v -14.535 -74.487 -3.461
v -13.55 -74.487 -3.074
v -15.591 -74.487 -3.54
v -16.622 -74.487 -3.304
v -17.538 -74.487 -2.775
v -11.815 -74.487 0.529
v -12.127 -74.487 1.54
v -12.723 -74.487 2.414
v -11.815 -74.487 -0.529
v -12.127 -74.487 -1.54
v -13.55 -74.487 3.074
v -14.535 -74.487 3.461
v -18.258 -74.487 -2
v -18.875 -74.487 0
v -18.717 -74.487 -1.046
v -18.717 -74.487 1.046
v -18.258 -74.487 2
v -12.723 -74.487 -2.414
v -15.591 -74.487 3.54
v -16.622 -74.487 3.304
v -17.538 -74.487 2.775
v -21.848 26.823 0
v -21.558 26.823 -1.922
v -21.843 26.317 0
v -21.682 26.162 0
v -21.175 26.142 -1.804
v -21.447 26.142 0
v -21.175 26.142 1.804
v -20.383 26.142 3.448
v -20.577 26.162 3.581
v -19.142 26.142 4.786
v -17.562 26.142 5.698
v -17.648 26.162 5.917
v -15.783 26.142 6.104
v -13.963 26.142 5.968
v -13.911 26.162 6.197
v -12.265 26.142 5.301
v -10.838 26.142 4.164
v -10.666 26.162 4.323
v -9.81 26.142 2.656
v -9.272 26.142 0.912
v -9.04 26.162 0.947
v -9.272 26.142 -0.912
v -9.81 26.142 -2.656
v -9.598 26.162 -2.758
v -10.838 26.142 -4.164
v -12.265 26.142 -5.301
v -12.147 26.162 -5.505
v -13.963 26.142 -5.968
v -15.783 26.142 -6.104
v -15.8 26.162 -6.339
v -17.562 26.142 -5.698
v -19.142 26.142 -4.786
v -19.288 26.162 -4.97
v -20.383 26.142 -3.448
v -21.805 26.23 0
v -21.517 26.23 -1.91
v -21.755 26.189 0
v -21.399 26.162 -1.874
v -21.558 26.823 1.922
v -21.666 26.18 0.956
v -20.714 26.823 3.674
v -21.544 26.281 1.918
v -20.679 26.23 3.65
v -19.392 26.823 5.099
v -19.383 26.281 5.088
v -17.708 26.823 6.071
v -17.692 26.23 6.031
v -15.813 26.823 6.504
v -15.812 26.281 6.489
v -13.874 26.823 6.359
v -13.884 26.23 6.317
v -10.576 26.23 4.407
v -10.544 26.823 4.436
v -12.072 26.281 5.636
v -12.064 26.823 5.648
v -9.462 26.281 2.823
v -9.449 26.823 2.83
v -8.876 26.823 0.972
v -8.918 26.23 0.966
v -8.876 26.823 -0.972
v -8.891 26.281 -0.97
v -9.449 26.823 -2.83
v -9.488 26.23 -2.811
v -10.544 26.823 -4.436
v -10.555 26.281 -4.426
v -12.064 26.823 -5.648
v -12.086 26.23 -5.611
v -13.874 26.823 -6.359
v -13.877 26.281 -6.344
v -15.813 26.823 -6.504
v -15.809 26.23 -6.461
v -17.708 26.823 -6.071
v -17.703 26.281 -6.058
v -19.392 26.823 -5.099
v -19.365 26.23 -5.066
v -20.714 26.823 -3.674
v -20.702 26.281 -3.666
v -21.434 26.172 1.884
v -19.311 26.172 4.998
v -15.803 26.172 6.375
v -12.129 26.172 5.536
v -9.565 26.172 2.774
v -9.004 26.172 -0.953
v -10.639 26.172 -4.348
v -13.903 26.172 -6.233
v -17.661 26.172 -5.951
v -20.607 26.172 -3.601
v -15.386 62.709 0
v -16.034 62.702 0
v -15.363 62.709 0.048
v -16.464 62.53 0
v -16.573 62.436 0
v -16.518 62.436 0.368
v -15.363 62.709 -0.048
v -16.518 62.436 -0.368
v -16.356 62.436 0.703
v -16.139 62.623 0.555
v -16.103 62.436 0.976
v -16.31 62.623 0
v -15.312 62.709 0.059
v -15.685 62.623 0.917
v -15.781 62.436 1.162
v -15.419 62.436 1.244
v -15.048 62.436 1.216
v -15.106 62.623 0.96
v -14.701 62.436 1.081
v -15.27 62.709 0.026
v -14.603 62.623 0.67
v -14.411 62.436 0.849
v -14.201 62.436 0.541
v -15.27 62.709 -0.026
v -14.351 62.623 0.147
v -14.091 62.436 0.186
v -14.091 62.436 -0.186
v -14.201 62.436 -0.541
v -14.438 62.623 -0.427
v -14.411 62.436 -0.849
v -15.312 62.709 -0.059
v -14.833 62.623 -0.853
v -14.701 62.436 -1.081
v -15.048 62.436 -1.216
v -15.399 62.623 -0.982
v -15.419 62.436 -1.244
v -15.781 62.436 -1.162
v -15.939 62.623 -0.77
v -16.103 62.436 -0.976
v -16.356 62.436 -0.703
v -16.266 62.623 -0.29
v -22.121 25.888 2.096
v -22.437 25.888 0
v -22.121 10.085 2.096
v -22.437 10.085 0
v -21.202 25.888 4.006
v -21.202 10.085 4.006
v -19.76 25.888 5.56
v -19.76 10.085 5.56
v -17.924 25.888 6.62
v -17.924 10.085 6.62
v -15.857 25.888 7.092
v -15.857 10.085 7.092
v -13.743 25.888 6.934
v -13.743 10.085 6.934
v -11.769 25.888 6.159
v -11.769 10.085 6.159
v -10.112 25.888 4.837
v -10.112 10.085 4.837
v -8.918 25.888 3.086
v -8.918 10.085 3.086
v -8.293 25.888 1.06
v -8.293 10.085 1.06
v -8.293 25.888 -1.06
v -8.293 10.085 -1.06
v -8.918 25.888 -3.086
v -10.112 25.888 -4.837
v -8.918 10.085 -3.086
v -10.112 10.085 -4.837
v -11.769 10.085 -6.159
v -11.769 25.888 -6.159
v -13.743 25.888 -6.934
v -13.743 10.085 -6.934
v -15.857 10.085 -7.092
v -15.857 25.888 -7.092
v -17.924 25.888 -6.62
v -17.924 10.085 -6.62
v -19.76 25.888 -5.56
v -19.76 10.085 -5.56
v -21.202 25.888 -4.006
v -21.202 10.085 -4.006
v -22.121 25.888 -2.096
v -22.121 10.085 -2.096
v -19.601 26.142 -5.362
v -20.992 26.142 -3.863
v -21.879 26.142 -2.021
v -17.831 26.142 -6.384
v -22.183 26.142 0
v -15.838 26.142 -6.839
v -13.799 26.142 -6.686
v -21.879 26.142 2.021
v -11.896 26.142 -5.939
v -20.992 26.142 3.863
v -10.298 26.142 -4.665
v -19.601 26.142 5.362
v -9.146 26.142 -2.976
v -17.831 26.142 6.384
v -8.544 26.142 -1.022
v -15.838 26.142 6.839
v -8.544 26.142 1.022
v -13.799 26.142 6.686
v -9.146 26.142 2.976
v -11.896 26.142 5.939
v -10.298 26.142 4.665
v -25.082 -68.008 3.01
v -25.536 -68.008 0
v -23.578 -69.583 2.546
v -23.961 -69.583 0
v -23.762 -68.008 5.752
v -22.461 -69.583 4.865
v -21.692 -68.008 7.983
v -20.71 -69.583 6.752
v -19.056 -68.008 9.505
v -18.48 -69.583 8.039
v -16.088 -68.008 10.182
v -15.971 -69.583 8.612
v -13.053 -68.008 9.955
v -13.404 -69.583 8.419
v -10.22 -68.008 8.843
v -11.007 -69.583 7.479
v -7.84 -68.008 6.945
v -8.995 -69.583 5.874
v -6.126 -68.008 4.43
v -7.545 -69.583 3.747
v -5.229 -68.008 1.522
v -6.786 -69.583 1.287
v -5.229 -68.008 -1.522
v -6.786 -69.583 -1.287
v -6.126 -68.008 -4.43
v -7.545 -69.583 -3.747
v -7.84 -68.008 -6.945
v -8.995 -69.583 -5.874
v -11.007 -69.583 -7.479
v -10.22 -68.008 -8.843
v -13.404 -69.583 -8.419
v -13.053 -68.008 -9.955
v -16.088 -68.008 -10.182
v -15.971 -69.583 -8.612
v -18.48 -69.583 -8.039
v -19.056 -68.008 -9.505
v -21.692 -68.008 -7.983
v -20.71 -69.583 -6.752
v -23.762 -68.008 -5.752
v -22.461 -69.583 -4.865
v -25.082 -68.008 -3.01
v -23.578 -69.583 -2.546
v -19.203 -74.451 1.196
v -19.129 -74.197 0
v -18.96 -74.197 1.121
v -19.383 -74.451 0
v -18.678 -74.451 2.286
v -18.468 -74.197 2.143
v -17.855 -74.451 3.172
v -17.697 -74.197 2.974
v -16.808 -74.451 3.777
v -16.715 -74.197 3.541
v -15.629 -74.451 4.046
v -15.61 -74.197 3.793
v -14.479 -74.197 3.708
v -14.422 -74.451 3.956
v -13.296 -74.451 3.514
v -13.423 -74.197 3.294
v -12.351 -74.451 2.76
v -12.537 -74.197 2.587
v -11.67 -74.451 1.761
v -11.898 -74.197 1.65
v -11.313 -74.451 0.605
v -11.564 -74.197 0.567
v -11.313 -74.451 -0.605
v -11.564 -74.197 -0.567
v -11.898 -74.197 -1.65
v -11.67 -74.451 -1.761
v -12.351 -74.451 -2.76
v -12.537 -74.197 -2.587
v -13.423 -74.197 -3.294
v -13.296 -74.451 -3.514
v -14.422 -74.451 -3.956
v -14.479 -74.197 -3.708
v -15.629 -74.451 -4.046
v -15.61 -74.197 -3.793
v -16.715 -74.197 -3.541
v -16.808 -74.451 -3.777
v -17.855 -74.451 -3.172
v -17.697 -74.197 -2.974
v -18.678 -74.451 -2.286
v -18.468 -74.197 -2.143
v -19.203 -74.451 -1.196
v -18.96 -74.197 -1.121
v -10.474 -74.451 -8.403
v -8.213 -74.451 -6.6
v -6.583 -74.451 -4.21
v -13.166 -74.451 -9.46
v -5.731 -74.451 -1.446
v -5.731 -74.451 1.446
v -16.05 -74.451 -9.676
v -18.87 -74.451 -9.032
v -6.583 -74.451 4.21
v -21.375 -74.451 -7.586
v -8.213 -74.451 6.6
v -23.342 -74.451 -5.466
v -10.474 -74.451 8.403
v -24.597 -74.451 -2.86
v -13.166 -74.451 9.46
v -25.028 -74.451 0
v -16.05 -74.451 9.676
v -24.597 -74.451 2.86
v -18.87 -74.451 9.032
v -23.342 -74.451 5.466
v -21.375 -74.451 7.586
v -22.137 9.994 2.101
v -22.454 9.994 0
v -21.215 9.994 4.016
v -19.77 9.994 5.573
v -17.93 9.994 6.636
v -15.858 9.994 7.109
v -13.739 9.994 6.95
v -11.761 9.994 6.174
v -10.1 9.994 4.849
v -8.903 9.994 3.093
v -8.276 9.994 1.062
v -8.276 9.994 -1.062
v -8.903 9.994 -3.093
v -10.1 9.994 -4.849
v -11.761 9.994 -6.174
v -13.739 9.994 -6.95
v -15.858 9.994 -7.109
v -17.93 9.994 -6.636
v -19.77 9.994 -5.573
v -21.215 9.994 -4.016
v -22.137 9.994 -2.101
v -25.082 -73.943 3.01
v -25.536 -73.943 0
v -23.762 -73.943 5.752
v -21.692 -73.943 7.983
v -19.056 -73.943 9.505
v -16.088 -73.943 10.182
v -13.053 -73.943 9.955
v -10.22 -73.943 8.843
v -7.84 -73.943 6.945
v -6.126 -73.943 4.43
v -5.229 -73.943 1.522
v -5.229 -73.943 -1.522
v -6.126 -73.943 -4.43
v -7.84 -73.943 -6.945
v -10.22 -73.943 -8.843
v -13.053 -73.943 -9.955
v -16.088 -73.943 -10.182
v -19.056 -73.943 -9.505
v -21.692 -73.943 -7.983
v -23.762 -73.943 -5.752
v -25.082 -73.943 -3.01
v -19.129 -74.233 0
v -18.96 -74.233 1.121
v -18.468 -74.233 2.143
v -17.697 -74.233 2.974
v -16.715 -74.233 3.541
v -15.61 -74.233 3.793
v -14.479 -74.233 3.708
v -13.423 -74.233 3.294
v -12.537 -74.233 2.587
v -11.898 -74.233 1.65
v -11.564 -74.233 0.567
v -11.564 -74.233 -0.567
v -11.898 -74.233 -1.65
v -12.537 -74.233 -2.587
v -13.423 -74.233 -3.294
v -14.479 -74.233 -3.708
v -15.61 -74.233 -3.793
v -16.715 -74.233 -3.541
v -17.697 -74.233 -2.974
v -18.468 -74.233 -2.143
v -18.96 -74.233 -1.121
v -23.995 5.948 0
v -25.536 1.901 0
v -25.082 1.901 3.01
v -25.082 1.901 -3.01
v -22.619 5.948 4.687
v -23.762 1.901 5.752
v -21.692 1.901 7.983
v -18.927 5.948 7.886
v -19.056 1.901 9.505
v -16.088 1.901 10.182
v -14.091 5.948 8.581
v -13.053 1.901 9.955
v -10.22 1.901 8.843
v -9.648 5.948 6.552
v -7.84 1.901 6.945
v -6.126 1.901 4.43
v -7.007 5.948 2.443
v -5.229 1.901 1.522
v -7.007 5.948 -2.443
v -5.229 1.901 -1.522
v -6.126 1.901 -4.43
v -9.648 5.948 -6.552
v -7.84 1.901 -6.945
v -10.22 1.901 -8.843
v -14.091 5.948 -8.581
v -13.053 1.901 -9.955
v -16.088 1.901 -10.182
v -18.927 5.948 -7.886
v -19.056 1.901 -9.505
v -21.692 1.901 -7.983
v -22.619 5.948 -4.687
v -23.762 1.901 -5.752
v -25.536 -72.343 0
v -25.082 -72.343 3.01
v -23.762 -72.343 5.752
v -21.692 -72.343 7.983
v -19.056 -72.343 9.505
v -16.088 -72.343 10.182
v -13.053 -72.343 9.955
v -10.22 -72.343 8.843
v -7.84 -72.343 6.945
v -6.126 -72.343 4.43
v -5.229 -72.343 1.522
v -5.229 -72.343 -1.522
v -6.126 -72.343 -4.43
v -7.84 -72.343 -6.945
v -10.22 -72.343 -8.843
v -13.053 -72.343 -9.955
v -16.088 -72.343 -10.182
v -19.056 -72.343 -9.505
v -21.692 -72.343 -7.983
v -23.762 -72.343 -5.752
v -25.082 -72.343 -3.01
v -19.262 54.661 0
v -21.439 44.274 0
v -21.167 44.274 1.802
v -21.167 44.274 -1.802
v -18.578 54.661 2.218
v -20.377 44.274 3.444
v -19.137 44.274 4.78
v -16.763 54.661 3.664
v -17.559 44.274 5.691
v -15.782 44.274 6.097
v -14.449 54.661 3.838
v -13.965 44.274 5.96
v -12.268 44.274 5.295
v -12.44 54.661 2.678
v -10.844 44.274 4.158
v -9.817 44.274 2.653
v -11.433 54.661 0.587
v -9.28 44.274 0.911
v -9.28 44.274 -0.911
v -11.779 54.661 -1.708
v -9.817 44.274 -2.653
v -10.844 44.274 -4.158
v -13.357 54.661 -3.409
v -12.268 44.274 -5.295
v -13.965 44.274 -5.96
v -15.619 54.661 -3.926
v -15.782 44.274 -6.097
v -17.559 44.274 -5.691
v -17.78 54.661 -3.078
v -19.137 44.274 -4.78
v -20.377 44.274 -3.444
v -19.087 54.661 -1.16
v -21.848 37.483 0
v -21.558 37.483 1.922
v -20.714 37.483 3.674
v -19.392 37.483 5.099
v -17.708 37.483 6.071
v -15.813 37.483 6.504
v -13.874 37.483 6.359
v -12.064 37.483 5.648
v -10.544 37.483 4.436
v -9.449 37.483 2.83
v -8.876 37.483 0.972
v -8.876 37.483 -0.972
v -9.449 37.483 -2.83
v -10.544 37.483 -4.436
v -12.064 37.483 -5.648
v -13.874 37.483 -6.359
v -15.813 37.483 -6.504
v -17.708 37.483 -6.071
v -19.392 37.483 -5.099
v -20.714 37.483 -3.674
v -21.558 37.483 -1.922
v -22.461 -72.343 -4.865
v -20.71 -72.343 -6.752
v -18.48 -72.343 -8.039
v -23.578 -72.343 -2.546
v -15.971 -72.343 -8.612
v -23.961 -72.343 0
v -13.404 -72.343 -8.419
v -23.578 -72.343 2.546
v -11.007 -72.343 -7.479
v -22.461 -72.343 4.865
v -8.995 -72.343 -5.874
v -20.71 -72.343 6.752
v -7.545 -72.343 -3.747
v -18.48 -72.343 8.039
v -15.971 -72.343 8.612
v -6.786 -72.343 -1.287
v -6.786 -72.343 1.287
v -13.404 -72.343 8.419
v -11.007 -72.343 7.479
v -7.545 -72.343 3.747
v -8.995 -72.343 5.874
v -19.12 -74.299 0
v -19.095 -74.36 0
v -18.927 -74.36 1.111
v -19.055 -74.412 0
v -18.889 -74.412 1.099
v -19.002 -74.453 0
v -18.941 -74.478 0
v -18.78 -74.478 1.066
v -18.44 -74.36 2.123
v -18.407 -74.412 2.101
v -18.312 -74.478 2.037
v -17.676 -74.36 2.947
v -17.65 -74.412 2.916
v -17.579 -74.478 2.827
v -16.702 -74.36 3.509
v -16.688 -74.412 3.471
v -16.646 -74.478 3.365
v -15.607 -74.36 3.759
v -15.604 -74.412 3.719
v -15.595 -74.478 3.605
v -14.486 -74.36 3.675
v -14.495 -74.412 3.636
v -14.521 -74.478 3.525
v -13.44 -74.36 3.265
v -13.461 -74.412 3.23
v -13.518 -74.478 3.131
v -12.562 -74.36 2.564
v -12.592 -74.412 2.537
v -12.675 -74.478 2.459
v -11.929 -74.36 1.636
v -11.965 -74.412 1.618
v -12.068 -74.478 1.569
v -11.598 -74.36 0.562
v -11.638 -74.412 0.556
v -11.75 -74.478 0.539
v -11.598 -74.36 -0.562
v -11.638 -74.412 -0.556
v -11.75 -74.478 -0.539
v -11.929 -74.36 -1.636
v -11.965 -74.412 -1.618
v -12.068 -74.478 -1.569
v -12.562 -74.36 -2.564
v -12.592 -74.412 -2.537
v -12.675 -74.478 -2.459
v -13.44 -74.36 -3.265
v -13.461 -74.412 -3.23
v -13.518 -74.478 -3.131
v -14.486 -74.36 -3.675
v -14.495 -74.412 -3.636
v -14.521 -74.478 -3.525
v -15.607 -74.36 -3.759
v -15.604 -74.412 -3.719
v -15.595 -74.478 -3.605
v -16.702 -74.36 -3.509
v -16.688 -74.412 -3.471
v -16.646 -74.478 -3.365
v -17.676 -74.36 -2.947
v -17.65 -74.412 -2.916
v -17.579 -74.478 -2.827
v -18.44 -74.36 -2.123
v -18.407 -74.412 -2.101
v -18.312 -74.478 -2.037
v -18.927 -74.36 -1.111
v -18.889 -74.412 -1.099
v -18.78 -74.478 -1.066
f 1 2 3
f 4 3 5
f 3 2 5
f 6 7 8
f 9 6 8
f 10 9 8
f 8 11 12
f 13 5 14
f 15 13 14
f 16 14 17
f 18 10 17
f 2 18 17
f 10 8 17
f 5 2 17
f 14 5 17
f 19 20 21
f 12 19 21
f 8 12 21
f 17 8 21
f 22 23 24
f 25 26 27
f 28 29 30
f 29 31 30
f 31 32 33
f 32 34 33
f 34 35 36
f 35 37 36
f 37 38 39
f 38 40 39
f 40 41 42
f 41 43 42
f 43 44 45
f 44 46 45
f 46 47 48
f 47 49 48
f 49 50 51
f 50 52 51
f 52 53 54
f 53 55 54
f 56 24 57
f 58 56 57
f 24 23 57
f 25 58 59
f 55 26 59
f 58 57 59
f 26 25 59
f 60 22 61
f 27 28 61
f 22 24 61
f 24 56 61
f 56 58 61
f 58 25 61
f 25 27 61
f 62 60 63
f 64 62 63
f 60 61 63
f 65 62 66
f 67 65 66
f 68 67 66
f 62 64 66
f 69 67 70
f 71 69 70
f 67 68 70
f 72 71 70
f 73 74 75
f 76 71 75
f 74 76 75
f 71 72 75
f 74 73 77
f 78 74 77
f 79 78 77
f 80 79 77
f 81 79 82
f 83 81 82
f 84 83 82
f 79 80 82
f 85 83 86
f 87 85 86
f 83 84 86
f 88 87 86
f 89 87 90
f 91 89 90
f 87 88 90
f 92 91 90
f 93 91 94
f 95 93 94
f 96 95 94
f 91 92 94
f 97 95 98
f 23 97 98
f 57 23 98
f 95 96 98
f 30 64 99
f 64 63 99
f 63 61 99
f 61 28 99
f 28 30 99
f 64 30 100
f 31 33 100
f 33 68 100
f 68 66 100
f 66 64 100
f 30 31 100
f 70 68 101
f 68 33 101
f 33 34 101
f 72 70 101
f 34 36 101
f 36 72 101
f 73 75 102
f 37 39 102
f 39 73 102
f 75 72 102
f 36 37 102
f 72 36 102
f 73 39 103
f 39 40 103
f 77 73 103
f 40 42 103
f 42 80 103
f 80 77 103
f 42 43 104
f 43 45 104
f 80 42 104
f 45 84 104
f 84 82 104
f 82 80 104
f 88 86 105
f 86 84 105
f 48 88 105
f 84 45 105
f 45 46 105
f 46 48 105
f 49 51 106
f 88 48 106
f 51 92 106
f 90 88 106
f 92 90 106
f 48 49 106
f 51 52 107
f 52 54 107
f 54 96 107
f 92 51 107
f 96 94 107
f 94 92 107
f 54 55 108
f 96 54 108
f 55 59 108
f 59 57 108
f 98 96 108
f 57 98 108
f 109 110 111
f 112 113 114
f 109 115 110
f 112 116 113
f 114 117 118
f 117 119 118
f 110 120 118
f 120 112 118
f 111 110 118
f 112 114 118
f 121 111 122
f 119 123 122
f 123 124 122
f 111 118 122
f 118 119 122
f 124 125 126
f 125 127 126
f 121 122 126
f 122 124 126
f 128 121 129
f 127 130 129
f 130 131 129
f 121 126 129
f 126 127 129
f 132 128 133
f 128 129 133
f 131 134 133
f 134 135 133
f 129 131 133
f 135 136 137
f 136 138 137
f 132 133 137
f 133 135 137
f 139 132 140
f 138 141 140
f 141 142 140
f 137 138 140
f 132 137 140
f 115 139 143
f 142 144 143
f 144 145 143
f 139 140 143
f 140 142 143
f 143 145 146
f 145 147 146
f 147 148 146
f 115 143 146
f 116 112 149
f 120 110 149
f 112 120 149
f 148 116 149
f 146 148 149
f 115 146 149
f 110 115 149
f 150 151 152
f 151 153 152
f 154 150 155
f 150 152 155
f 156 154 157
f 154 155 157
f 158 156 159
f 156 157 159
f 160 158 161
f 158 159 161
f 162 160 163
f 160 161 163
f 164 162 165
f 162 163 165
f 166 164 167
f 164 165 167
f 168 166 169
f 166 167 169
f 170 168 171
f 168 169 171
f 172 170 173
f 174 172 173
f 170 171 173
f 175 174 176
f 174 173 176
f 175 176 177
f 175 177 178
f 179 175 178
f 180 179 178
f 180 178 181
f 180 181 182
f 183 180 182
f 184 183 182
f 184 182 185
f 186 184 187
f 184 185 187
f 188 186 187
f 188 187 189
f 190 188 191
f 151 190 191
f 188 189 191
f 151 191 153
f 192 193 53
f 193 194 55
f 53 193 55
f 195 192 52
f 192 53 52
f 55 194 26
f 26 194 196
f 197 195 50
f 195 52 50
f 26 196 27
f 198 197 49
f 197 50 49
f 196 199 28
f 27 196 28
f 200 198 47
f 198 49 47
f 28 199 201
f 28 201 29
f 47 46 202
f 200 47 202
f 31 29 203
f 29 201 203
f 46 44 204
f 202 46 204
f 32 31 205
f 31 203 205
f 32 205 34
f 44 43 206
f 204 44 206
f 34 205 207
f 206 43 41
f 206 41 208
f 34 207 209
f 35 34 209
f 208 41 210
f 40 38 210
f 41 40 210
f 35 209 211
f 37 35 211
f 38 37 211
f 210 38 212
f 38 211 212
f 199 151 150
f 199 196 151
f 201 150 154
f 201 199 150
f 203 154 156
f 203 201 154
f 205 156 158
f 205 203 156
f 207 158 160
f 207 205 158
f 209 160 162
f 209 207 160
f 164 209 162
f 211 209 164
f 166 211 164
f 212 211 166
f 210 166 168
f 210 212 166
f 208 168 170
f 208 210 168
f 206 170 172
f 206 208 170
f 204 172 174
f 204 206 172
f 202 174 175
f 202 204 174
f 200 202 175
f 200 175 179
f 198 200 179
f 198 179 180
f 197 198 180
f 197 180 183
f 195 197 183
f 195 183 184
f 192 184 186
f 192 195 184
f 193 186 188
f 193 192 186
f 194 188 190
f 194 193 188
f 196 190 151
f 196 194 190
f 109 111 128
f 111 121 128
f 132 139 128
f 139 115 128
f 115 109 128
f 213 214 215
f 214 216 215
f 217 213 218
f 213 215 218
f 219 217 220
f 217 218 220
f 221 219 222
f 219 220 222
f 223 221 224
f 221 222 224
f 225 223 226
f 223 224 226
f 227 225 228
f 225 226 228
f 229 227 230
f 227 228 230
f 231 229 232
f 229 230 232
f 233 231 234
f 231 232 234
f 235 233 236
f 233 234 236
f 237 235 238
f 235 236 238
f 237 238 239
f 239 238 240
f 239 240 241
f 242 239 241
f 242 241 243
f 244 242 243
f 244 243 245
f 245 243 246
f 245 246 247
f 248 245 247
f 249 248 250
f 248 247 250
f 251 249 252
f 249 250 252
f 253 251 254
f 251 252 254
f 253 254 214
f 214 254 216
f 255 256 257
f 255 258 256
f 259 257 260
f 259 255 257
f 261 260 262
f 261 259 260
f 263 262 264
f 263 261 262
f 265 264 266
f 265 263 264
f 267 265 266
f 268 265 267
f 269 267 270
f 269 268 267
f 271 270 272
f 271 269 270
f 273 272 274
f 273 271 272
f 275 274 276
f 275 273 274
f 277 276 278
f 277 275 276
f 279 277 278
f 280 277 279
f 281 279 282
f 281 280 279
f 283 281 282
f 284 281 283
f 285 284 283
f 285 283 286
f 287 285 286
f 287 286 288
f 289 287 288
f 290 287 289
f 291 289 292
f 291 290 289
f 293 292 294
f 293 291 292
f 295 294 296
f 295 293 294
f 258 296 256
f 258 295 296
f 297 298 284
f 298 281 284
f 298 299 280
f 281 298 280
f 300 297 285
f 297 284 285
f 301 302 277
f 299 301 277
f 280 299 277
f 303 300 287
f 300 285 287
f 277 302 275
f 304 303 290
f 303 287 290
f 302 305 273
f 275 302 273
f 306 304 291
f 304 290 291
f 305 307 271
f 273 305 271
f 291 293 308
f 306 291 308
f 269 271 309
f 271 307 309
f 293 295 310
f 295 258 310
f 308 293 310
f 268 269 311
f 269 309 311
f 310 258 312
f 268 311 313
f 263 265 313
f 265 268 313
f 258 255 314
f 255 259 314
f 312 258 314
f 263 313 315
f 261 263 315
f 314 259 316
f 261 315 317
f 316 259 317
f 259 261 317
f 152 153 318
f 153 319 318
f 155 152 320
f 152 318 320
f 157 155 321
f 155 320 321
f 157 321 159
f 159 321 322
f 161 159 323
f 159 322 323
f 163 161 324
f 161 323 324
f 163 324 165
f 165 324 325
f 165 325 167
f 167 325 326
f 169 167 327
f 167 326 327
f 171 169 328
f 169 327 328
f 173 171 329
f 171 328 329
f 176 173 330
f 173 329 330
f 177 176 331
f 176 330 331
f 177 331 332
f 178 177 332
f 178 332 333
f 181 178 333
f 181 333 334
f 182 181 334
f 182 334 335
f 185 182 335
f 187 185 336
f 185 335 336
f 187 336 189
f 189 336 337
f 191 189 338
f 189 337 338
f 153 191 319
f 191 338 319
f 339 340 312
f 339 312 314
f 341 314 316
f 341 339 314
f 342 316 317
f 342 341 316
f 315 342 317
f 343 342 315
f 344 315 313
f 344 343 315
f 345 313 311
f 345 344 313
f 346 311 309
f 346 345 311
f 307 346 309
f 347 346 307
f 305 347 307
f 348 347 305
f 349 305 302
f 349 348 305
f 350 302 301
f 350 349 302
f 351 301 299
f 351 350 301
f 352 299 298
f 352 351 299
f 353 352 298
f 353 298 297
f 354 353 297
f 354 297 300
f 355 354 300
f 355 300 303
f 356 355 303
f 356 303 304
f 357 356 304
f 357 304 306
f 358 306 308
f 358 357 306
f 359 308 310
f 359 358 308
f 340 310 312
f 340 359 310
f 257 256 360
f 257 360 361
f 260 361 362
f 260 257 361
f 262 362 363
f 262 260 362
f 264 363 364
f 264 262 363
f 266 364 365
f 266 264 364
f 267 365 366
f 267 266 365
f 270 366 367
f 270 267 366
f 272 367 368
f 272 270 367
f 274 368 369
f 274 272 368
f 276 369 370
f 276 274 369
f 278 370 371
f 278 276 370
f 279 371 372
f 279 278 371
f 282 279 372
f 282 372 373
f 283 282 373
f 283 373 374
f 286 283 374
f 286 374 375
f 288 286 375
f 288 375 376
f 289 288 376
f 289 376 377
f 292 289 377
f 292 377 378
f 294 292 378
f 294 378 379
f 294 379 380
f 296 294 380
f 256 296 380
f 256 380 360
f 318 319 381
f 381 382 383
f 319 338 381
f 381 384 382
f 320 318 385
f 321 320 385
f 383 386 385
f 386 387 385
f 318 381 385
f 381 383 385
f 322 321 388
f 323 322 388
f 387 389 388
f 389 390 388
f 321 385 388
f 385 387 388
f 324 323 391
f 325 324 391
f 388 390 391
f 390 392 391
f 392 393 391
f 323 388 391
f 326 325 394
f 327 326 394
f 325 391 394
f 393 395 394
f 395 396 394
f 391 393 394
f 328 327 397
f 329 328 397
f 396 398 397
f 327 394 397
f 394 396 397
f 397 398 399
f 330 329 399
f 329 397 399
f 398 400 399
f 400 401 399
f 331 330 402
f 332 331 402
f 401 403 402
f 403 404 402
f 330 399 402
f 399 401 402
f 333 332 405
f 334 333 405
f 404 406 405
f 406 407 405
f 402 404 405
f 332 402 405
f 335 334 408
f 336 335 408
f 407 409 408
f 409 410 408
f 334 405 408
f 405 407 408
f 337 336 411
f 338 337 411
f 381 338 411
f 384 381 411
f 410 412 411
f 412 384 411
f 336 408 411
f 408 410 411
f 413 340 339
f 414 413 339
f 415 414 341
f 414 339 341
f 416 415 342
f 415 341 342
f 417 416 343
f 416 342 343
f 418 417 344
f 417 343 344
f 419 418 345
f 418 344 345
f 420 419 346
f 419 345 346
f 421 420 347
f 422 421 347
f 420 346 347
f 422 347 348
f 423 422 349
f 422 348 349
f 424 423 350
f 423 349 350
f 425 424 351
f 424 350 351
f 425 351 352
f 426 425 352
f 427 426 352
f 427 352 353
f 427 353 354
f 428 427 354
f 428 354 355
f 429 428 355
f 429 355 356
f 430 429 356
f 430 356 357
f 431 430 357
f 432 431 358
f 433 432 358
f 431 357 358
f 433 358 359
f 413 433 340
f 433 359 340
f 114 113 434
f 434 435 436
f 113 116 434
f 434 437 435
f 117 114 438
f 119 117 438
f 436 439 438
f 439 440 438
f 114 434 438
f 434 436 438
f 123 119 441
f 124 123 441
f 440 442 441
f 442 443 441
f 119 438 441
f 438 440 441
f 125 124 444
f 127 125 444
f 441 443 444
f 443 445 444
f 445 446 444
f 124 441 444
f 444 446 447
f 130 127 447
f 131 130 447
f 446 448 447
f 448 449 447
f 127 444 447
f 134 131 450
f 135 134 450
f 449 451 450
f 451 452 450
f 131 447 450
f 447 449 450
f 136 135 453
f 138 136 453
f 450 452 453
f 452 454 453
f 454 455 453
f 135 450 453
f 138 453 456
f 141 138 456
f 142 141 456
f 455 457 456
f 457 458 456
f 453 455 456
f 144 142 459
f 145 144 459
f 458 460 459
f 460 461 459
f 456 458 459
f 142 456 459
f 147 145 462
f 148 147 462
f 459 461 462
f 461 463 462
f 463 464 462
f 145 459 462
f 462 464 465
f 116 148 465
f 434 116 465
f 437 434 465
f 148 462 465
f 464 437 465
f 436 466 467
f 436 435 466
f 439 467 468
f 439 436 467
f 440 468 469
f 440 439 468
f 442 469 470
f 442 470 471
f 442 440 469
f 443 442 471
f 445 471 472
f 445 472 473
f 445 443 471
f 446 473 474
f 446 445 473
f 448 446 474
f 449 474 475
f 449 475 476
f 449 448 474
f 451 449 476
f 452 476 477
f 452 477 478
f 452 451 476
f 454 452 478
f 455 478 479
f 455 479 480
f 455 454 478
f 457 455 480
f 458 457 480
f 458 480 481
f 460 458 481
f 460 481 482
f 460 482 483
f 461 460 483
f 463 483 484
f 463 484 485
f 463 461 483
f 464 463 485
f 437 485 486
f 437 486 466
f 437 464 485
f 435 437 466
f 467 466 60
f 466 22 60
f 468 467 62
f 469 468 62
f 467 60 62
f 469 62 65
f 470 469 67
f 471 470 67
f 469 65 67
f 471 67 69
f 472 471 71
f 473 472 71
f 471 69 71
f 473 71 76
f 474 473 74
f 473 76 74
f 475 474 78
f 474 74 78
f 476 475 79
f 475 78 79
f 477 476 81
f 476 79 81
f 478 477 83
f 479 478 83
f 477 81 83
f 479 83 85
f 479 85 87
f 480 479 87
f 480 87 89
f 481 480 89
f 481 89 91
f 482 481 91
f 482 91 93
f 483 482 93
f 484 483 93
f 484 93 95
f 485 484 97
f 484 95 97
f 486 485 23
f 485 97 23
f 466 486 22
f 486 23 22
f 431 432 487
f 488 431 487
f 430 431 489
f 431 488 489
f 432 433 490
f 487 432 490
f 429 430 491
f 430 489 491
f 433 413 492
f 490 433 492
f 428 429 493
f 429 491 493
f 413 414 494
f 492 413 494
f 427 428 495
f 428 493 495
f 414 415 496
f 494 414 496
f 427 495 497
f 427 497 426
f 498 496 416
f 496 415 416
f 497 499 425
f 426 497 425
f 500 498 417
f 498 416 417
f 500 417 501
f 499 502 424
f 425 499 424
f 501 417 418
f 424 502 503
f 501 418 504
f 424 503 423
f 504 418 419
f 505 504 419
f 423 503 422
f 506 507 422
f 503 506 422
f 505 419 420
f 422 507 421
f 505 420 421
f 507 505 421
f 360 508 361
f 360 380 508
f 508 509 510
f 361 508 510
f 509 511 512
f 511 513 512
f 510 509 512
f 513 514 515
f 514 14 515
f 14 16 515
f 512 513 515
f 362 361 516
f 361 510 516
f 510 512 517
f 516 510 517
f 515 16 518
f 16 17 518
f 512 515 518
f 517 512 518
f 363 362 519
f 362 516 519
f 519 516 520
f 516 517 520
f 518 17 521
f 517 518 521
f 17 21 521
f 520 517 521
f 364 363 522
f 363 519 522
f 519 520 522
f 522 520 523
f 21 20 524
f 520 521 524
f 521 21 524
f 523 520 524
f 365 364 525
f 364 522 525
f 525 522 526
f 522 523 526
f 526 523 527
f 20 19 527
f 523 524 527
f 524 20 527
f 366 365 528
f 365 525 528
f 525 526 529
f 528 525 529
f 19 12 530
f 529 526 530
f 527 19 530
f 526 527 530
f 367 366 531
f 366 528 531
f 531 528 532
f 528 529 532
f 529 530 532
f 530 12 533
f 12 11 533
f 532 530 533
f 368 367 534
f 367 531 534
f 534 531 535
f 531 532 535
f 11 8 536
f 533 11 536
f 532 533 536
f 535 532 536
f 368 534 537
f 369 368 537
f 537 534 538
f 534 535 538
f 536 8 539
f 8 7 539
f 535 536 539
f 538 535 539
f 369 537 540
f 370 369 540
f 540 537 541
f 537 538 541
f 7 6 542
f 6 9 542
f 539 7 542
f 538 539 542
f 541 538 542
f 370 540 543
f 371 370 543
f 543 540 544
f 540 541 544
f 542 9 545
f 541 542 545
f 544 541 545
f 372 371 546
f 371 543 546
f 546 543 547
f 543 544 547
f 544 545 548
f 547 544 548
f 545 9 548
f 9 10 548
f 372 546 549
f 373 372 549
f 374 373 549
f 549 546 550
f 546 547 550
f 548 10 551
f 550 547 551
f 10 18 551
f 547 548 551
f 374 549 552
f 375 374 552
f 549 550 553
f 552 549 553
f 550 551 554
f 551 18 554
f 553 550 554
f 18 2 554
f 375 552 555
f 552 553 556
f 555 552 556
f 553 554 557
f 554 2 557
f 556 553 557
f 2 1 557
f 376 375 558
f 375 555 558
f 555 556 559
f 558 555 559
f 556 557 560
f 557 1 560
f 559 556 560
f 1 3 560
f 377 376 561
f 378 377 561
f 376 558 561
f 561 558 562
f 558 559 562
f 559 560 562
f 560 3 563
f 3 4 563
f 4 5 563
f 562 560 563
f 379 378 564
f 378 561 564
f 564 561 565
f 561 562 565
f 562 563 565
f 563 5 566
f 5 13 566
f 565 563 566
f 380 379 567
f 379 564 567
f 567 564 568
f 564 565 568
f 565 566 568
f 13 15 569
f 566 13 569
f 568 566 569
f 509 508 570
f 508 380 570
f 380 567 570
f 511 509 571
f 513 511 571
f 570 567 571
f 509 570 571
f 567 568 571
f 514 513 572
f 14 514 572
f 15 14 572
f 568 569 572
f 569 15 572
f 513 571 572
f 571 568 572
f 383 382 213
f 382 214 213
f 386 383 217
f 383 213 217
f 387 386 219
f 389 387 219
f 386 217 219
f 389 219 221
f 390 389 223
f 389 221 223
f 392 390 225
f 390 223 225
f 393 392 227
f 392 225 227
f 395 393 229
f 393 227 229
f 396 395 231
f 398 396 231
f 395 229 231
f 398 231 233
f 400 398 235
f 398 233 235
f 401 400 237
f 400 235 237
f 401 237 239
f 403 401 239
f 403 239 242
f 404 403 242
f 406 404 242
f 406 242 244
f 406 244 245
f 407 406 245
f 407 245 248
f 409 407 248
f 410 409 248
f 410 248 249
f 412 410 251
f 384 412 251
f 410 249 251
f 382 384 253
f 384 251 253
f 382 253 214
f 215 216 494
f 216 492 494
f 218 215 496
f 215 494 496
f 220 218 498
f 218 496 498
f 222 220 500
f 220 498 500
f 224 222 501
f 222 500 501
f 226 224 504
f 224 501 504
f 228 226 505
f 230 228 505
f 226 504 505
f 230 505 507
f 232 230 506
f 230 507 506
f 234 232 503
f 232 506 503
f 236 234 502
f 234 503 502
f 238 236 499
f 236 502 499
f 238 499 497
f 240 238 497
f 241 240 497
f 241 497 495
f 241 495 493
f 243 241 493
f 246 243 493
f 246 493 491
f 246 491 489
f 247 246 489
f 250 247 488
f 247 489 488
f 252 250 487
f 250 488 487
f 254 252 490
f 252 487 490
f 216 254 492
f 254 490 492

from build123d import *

# Parameters (mm, degrees)
F3_DEPTH = 5.3848
F4_R     = 0.254
F5_SIZE  = 0.508


# Not quite as in the source:
# - a fillet or chamfer that OpenCascade refuses, or shapes differently, is made with other operations: its cross-section is extruded or revolved along the edge and cut away or added


with BuildPart() as f1:
    # F0 (on Top) → F1 (revolve)
    with BuildSketch(Plane.XY):
        Polygon((-19.1289222062, -69.1020740439), (-15.3252963252, -69.1020740439), (-15.3252963252, 26.1417003232), (-21.4466963252, 26.1417003232), (-22.4372963252, 26.1417003232), (-22.4372963252, 10.0381003232), (-25.5360963252, 1.9012442353), (-25.5360963252, -68.0084118526), (-23.9612963252, -69.5832118526), (-23.9612963252, -72.3429557647), (-25.5360963252, -72.3429557647), (-25.5360963252, -74.4511557647), (-19.1289222062, -74.4511557647), align=None)
        with BuildLine():
            Line((-21.4466963252, 26.1417003232), (-15.3252963252, 26.1417003232))
            Line((-15.3252963252, 26.1417003232), (-15.3252963252, 62.7088442353))
            Line((-15.3252963252, 62.7088442353), (-15.3863094747, 62.7088442353))
            add(Edge.make_bspline(
                [(-15.3863094747, 62.7088442353), (-16.22922346, 62.7838820219), (-16.4167433977, 62.5745207071), (-16.5730696172, 62.435567379)],
                knots=[0, 0, 0, 0, 1.2178176694, 1.2178176694, 1.2178176694, 1.2178176694], degree=3))
            add(Edge.make_bspline(
                [(-16.5730696172, 62.435567379), (-19.0194975585, 56.8844638765), (-20.2809497714, 50.9883202612), (-21.4389152825, 44.2740693688)],
                knots=[0, 0, 0, 0, 18.8020335074, 18.8020335074, 18.8020335074, 18.8020335074], degree=3))
            add(Edge.make_bspline(
                [(-21.8475367874, 37.4826304615), (-21.8703859069, 39.438161999), (-21.8947399408, 42.3613935709), (-21.4389152825, 44.2740693688)],
                knots=[0, 0, 0, 0, 6.8037205974, 6.8037205974, 6.8037205974, 6.8037205974], degree=3))
            Line((-21.8475367874, 37.4826304615), (-21.8475367874, 26.8227737397))
            add(Edge.make_bspline(
                [(-21.8475367874, 26.8227737397), (-21.8473226346, 26.2848939747), (-21.9419963252, 26.1417003232), (-21.4466963252, 26.1417003232)],
                knots=[0, 0, 0, 0, 0.7902746831, 0.7902746831, 0.7902746831, 0.7902746831], degree=3))
        make_face()
    revolve(axis=Axis((-15.3252963252, -24.1547277207, 0), (0, 1, 0)))

    # F2: chamfer of 0.254 on 3 edges, made by hand

    # F2_s1 → F2_t2 (revolve)
    with BuildSketch(Plane.XY):
        Polygon((-22.4372963252, 10.0848293801), (-22.4539271766, 9.9944308884), (-22.4372963252, 10.0381003232), align=None)
    revolve(axis=Axis((-15.3252963252, 10.0381003232, 0), (0, 1, 0)))

    # F2_s3 → F2_t4 (revolve, cut)
    with BuildSketch(Plane.XY):
        Polygon((-19.1289222062, -74.1971557647), (-19.3829222062, -74.4511557647), (-19.1289222062, -74.4511557647), align=None)
    revolve(axis=Axis((-15.3252963252, -74.4511557647, 0), (0, 1, 0)), mode=Mode.SUBTRACT)

    # F2_s5 → F2_t6 (revolve, cut)
    with BuildSketch(Plane.XY):
        Polygon((-22.4372963252, 25.8877003232), (-22.1832963252, 26.1417003232), (-22.4372963252, 26.1417003232), align=None)
    revolve(axis=Axis((-15.3252963252, 26.1417003232, 0), (0, 1, 0)), mode=Mode.SUBTRACT)

    # F3 (add): a face of the model
    f3_faces = [f1.faces().sort_by_distance(p)[0] for p in [
        (-15.3252963252, -69.1020740439, 0),
    ]]
    extrude(f3_faces, amount=F3_DEPTH)

    # F4
    f4_edges = [f1.edges().sort_by_distance(p)[0] for p in [
        (-11.52167, -74.486874, 0),
    ]]
    fillet(f4_edges, radius=F4_R)

    # F5
    f5_edges = [f1.edges().sort_by_distance(p)[0] for p in [
        (-5.114496, -74.451156, 0),
    ]]
    chamfer(f5_edges, length=F5_SIZE)


solid = f1.part
